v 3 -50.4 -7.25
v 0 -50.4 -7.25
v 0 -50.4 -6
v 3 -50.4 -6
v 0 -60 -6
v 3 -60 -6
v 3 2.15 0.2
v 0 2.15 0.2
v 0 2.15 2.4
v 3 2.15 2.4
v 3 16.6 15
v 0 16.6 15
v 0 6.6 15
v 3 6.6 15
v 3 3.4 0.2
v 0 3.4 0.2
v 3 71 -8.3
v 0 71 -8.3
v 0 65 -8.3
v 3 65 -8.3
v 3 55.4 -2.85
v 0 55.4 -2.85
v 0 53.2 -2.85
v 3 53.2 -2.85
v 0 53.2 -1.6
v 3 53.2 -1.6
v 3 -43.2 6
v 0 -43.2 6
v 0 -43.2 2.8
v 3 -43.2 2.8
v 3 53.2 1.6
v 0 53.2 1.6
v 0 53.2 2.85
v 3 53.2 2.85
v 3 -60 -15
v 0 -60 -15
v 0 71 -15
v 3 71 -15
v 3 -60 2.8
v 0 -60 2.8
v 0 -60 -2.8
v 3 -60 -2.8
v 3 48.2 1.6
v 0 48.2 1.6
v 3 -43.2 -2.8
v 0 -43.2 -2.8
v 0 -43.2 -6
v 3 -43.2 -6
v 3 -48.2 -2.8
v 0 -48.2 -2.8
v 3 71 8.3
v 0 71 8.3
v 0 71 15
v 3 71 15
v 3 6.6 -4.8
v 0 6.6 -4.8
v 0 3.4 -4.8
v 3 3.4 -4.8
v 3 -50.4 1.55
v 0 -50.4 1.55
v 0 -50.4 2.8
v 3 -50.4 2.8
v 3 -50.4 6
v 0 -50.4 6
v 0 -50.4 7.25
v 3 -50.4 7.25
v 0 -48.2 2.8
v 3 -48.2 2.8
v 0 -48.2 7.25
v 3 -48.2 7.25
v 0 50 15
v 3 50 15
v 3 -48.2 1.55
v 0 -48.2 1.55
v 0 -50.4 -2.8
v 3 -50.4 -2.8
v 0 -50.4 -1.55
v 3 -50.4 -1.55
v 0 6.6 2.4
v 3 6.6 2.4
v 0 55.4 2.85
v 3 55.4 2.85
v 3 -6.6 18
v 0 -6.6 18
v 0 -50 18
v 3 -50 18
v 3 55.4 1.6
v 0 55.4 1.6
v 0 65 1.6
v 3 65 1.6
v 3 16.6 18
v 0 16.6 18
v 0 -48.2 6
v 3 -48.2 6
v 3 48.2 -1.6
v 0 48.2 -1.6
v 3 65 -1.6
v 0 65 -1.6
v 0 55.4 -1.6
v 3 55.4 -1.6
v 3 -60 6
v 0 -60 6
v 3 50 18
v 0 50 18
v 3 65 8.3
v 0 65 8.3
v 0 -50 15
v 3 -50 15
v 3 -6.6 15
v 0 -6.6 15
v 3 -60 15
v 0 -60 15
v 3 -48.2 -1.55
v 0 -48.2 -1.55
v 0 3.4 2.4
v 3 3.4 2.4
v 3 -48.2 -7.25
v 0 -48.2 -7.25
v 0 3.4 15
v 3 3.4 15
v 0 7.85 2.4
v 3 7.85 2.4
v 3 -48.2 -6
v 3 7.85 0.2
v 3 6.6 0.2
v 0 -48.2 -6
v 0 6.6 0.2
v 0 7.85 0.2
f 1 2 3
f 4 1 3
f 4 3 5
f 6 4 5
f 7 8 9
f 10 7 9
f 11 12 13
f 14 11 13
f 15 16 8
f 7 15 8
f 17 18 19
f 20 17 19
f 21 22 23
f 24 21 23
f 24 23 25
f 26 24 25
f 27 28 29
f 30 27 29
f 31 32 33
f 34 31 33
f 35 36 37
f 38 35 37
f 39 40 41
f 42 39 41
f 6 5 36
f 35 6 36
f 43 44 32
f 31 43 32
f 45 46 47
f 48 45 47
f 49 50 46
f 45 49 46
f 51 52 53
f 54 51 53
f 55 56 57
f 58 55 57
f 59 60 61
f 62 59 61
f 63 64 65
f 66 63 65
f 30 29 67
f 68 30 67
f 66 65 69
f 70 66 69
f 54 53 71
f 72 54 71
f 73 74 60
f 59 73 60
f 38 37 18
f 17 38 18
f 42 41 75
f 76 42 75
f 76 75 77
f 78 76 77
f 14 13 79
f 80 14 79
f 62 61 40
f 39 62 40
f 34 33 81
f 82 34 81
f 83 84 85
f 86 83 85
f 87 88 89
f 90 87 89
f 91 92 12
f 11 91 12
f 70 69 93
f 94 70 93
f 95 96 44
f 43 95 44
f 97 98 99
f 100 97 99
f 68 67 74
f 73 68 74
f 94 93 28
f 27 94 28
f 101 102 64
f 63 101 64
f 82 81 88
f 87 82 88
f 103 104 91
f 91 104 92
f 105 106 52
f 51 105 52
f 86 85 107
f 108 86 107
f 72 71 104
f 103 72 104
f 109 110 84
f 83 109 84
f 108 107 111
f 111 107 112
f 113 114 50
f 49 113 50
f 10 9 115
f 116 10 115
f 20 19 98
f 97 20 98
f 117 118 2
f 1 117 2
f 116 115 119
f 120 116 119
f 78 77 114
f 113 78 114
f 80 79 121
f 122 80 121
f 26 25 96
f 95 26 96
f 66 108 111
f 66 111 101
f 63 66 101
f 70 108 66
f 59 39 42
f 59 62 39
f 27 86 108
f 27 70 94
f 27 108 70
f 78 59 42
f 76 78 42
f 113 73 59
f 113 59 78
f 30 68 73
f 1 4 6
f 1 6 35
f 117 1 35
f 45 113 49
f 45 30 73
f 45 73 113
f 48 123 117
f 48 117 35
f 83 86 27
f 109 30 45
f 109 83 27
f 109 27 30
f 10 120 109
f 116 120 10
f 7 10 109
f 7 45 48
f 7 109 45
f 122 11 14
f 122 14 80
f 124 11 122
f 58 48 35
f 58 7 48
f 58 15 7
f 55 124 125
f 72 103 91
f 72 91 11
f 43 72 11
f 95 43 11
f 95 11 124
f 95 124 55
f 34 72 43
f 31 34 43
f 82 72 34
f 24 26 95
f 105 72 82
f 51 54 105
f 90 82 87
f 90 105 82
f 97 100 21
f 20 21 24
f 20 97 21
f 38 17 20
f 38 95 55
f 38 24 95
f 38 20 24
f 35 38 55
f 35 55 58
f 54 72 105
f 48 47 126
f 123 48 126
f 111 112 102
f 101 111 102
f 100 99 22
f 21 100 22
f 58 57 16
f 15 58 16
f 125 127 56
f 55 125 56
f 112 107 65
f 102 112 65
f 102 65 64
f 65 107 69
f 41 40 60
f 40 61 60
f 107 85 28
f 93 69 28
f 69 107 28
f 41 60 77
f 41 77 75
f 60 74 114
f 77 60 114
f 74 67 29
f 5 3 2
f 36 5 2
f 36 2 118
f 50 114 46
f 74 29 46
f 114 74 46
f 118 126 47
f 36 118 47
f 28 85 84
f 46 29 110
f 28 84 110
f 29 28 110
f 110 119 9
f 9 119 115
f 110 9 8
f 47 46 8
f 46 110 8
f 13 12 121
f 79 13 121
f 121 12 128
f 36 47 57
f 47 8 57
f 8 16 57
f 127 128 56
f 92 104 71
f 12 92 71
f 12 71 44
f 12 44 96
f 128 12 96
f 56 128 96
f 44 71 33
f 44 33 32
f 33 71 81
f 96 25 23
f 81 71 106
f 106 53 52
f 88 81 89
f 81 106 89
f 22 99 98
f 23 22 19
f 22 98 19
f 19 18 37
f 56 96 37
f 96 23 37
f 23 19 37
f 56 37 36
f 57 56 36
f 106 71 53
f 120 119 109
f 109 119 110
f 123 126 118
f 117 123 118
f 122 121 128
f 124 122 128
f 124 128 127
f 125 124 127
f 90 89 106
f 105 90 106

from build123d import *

# Parameters (mm, degrees)
BOSS_EXTRUDE1_DEPTH = 3


with BuildPart() as part:
    # Sketch1 → Boss-Extrude1 (new body)
    with BuildSketch(Plane(origin=(0, 0, 0), x_dir=(0, 0, -1), z_dir=(1, 0, 0))):
        Polygon((-2.8, -60), (2.8, -60), (2.8, -50.4), (1.55, -50.4), (1.55, -48.2), (2.8, -48.2), (2.8, -43.2), (6, -43.2), (6, -48.2), (7.25, -48.2), (7.25, -50.4), (6, -50.4), (6, -60), (15, -60), (15, 60), (15, 71), (8.3, 71), (8.3, 65), (1.6, 65), (1.6, 55.4), (2.85, 55.4), (2.85, 53.2), (1.6, 53.2), (1.6, 48.2), (-1.6, 48.2), (-1.6, 53.2), (-2.85, 53.2), (-2.85, 55.4), (-1.6, 55.4), (-1.6, 65), (-8.3, 65), (-8.3, 71), (-15, 71), (-15, 60), (-15, 55), (-15, 50), (-18, 50), (-18, 16.6), (-15, 16.6), (-15, 6.6), (-2.4, 6.6), (-2.4, 7.85), (-0.2, 7.85), (-0.2, 6.6), (4.8, 6.6), (4.8, 3.4), (-0.2, 3.4), (-0.2, 2.15), (-2.4, 2.15), (-2.4, 3.4), (-15, 3.4), (-15, -6.6), (-18, -6.6), (-18, -50), (-15, -50), (-15, -60), (-6, -60), (-6, -50.4), (-7.25, -50.4), (-7.25, -48.2), (-6, -48.2), (-6, -43.2), (-2.8, -43.2), (-2.8, -48.2), (-1.55, -48.2), (-1.55, -50.4), (-2.8, -50.4), align=None)
    extrude(amount=BOSS_EXTRUDE1_DEPTH)


solid = part.part
